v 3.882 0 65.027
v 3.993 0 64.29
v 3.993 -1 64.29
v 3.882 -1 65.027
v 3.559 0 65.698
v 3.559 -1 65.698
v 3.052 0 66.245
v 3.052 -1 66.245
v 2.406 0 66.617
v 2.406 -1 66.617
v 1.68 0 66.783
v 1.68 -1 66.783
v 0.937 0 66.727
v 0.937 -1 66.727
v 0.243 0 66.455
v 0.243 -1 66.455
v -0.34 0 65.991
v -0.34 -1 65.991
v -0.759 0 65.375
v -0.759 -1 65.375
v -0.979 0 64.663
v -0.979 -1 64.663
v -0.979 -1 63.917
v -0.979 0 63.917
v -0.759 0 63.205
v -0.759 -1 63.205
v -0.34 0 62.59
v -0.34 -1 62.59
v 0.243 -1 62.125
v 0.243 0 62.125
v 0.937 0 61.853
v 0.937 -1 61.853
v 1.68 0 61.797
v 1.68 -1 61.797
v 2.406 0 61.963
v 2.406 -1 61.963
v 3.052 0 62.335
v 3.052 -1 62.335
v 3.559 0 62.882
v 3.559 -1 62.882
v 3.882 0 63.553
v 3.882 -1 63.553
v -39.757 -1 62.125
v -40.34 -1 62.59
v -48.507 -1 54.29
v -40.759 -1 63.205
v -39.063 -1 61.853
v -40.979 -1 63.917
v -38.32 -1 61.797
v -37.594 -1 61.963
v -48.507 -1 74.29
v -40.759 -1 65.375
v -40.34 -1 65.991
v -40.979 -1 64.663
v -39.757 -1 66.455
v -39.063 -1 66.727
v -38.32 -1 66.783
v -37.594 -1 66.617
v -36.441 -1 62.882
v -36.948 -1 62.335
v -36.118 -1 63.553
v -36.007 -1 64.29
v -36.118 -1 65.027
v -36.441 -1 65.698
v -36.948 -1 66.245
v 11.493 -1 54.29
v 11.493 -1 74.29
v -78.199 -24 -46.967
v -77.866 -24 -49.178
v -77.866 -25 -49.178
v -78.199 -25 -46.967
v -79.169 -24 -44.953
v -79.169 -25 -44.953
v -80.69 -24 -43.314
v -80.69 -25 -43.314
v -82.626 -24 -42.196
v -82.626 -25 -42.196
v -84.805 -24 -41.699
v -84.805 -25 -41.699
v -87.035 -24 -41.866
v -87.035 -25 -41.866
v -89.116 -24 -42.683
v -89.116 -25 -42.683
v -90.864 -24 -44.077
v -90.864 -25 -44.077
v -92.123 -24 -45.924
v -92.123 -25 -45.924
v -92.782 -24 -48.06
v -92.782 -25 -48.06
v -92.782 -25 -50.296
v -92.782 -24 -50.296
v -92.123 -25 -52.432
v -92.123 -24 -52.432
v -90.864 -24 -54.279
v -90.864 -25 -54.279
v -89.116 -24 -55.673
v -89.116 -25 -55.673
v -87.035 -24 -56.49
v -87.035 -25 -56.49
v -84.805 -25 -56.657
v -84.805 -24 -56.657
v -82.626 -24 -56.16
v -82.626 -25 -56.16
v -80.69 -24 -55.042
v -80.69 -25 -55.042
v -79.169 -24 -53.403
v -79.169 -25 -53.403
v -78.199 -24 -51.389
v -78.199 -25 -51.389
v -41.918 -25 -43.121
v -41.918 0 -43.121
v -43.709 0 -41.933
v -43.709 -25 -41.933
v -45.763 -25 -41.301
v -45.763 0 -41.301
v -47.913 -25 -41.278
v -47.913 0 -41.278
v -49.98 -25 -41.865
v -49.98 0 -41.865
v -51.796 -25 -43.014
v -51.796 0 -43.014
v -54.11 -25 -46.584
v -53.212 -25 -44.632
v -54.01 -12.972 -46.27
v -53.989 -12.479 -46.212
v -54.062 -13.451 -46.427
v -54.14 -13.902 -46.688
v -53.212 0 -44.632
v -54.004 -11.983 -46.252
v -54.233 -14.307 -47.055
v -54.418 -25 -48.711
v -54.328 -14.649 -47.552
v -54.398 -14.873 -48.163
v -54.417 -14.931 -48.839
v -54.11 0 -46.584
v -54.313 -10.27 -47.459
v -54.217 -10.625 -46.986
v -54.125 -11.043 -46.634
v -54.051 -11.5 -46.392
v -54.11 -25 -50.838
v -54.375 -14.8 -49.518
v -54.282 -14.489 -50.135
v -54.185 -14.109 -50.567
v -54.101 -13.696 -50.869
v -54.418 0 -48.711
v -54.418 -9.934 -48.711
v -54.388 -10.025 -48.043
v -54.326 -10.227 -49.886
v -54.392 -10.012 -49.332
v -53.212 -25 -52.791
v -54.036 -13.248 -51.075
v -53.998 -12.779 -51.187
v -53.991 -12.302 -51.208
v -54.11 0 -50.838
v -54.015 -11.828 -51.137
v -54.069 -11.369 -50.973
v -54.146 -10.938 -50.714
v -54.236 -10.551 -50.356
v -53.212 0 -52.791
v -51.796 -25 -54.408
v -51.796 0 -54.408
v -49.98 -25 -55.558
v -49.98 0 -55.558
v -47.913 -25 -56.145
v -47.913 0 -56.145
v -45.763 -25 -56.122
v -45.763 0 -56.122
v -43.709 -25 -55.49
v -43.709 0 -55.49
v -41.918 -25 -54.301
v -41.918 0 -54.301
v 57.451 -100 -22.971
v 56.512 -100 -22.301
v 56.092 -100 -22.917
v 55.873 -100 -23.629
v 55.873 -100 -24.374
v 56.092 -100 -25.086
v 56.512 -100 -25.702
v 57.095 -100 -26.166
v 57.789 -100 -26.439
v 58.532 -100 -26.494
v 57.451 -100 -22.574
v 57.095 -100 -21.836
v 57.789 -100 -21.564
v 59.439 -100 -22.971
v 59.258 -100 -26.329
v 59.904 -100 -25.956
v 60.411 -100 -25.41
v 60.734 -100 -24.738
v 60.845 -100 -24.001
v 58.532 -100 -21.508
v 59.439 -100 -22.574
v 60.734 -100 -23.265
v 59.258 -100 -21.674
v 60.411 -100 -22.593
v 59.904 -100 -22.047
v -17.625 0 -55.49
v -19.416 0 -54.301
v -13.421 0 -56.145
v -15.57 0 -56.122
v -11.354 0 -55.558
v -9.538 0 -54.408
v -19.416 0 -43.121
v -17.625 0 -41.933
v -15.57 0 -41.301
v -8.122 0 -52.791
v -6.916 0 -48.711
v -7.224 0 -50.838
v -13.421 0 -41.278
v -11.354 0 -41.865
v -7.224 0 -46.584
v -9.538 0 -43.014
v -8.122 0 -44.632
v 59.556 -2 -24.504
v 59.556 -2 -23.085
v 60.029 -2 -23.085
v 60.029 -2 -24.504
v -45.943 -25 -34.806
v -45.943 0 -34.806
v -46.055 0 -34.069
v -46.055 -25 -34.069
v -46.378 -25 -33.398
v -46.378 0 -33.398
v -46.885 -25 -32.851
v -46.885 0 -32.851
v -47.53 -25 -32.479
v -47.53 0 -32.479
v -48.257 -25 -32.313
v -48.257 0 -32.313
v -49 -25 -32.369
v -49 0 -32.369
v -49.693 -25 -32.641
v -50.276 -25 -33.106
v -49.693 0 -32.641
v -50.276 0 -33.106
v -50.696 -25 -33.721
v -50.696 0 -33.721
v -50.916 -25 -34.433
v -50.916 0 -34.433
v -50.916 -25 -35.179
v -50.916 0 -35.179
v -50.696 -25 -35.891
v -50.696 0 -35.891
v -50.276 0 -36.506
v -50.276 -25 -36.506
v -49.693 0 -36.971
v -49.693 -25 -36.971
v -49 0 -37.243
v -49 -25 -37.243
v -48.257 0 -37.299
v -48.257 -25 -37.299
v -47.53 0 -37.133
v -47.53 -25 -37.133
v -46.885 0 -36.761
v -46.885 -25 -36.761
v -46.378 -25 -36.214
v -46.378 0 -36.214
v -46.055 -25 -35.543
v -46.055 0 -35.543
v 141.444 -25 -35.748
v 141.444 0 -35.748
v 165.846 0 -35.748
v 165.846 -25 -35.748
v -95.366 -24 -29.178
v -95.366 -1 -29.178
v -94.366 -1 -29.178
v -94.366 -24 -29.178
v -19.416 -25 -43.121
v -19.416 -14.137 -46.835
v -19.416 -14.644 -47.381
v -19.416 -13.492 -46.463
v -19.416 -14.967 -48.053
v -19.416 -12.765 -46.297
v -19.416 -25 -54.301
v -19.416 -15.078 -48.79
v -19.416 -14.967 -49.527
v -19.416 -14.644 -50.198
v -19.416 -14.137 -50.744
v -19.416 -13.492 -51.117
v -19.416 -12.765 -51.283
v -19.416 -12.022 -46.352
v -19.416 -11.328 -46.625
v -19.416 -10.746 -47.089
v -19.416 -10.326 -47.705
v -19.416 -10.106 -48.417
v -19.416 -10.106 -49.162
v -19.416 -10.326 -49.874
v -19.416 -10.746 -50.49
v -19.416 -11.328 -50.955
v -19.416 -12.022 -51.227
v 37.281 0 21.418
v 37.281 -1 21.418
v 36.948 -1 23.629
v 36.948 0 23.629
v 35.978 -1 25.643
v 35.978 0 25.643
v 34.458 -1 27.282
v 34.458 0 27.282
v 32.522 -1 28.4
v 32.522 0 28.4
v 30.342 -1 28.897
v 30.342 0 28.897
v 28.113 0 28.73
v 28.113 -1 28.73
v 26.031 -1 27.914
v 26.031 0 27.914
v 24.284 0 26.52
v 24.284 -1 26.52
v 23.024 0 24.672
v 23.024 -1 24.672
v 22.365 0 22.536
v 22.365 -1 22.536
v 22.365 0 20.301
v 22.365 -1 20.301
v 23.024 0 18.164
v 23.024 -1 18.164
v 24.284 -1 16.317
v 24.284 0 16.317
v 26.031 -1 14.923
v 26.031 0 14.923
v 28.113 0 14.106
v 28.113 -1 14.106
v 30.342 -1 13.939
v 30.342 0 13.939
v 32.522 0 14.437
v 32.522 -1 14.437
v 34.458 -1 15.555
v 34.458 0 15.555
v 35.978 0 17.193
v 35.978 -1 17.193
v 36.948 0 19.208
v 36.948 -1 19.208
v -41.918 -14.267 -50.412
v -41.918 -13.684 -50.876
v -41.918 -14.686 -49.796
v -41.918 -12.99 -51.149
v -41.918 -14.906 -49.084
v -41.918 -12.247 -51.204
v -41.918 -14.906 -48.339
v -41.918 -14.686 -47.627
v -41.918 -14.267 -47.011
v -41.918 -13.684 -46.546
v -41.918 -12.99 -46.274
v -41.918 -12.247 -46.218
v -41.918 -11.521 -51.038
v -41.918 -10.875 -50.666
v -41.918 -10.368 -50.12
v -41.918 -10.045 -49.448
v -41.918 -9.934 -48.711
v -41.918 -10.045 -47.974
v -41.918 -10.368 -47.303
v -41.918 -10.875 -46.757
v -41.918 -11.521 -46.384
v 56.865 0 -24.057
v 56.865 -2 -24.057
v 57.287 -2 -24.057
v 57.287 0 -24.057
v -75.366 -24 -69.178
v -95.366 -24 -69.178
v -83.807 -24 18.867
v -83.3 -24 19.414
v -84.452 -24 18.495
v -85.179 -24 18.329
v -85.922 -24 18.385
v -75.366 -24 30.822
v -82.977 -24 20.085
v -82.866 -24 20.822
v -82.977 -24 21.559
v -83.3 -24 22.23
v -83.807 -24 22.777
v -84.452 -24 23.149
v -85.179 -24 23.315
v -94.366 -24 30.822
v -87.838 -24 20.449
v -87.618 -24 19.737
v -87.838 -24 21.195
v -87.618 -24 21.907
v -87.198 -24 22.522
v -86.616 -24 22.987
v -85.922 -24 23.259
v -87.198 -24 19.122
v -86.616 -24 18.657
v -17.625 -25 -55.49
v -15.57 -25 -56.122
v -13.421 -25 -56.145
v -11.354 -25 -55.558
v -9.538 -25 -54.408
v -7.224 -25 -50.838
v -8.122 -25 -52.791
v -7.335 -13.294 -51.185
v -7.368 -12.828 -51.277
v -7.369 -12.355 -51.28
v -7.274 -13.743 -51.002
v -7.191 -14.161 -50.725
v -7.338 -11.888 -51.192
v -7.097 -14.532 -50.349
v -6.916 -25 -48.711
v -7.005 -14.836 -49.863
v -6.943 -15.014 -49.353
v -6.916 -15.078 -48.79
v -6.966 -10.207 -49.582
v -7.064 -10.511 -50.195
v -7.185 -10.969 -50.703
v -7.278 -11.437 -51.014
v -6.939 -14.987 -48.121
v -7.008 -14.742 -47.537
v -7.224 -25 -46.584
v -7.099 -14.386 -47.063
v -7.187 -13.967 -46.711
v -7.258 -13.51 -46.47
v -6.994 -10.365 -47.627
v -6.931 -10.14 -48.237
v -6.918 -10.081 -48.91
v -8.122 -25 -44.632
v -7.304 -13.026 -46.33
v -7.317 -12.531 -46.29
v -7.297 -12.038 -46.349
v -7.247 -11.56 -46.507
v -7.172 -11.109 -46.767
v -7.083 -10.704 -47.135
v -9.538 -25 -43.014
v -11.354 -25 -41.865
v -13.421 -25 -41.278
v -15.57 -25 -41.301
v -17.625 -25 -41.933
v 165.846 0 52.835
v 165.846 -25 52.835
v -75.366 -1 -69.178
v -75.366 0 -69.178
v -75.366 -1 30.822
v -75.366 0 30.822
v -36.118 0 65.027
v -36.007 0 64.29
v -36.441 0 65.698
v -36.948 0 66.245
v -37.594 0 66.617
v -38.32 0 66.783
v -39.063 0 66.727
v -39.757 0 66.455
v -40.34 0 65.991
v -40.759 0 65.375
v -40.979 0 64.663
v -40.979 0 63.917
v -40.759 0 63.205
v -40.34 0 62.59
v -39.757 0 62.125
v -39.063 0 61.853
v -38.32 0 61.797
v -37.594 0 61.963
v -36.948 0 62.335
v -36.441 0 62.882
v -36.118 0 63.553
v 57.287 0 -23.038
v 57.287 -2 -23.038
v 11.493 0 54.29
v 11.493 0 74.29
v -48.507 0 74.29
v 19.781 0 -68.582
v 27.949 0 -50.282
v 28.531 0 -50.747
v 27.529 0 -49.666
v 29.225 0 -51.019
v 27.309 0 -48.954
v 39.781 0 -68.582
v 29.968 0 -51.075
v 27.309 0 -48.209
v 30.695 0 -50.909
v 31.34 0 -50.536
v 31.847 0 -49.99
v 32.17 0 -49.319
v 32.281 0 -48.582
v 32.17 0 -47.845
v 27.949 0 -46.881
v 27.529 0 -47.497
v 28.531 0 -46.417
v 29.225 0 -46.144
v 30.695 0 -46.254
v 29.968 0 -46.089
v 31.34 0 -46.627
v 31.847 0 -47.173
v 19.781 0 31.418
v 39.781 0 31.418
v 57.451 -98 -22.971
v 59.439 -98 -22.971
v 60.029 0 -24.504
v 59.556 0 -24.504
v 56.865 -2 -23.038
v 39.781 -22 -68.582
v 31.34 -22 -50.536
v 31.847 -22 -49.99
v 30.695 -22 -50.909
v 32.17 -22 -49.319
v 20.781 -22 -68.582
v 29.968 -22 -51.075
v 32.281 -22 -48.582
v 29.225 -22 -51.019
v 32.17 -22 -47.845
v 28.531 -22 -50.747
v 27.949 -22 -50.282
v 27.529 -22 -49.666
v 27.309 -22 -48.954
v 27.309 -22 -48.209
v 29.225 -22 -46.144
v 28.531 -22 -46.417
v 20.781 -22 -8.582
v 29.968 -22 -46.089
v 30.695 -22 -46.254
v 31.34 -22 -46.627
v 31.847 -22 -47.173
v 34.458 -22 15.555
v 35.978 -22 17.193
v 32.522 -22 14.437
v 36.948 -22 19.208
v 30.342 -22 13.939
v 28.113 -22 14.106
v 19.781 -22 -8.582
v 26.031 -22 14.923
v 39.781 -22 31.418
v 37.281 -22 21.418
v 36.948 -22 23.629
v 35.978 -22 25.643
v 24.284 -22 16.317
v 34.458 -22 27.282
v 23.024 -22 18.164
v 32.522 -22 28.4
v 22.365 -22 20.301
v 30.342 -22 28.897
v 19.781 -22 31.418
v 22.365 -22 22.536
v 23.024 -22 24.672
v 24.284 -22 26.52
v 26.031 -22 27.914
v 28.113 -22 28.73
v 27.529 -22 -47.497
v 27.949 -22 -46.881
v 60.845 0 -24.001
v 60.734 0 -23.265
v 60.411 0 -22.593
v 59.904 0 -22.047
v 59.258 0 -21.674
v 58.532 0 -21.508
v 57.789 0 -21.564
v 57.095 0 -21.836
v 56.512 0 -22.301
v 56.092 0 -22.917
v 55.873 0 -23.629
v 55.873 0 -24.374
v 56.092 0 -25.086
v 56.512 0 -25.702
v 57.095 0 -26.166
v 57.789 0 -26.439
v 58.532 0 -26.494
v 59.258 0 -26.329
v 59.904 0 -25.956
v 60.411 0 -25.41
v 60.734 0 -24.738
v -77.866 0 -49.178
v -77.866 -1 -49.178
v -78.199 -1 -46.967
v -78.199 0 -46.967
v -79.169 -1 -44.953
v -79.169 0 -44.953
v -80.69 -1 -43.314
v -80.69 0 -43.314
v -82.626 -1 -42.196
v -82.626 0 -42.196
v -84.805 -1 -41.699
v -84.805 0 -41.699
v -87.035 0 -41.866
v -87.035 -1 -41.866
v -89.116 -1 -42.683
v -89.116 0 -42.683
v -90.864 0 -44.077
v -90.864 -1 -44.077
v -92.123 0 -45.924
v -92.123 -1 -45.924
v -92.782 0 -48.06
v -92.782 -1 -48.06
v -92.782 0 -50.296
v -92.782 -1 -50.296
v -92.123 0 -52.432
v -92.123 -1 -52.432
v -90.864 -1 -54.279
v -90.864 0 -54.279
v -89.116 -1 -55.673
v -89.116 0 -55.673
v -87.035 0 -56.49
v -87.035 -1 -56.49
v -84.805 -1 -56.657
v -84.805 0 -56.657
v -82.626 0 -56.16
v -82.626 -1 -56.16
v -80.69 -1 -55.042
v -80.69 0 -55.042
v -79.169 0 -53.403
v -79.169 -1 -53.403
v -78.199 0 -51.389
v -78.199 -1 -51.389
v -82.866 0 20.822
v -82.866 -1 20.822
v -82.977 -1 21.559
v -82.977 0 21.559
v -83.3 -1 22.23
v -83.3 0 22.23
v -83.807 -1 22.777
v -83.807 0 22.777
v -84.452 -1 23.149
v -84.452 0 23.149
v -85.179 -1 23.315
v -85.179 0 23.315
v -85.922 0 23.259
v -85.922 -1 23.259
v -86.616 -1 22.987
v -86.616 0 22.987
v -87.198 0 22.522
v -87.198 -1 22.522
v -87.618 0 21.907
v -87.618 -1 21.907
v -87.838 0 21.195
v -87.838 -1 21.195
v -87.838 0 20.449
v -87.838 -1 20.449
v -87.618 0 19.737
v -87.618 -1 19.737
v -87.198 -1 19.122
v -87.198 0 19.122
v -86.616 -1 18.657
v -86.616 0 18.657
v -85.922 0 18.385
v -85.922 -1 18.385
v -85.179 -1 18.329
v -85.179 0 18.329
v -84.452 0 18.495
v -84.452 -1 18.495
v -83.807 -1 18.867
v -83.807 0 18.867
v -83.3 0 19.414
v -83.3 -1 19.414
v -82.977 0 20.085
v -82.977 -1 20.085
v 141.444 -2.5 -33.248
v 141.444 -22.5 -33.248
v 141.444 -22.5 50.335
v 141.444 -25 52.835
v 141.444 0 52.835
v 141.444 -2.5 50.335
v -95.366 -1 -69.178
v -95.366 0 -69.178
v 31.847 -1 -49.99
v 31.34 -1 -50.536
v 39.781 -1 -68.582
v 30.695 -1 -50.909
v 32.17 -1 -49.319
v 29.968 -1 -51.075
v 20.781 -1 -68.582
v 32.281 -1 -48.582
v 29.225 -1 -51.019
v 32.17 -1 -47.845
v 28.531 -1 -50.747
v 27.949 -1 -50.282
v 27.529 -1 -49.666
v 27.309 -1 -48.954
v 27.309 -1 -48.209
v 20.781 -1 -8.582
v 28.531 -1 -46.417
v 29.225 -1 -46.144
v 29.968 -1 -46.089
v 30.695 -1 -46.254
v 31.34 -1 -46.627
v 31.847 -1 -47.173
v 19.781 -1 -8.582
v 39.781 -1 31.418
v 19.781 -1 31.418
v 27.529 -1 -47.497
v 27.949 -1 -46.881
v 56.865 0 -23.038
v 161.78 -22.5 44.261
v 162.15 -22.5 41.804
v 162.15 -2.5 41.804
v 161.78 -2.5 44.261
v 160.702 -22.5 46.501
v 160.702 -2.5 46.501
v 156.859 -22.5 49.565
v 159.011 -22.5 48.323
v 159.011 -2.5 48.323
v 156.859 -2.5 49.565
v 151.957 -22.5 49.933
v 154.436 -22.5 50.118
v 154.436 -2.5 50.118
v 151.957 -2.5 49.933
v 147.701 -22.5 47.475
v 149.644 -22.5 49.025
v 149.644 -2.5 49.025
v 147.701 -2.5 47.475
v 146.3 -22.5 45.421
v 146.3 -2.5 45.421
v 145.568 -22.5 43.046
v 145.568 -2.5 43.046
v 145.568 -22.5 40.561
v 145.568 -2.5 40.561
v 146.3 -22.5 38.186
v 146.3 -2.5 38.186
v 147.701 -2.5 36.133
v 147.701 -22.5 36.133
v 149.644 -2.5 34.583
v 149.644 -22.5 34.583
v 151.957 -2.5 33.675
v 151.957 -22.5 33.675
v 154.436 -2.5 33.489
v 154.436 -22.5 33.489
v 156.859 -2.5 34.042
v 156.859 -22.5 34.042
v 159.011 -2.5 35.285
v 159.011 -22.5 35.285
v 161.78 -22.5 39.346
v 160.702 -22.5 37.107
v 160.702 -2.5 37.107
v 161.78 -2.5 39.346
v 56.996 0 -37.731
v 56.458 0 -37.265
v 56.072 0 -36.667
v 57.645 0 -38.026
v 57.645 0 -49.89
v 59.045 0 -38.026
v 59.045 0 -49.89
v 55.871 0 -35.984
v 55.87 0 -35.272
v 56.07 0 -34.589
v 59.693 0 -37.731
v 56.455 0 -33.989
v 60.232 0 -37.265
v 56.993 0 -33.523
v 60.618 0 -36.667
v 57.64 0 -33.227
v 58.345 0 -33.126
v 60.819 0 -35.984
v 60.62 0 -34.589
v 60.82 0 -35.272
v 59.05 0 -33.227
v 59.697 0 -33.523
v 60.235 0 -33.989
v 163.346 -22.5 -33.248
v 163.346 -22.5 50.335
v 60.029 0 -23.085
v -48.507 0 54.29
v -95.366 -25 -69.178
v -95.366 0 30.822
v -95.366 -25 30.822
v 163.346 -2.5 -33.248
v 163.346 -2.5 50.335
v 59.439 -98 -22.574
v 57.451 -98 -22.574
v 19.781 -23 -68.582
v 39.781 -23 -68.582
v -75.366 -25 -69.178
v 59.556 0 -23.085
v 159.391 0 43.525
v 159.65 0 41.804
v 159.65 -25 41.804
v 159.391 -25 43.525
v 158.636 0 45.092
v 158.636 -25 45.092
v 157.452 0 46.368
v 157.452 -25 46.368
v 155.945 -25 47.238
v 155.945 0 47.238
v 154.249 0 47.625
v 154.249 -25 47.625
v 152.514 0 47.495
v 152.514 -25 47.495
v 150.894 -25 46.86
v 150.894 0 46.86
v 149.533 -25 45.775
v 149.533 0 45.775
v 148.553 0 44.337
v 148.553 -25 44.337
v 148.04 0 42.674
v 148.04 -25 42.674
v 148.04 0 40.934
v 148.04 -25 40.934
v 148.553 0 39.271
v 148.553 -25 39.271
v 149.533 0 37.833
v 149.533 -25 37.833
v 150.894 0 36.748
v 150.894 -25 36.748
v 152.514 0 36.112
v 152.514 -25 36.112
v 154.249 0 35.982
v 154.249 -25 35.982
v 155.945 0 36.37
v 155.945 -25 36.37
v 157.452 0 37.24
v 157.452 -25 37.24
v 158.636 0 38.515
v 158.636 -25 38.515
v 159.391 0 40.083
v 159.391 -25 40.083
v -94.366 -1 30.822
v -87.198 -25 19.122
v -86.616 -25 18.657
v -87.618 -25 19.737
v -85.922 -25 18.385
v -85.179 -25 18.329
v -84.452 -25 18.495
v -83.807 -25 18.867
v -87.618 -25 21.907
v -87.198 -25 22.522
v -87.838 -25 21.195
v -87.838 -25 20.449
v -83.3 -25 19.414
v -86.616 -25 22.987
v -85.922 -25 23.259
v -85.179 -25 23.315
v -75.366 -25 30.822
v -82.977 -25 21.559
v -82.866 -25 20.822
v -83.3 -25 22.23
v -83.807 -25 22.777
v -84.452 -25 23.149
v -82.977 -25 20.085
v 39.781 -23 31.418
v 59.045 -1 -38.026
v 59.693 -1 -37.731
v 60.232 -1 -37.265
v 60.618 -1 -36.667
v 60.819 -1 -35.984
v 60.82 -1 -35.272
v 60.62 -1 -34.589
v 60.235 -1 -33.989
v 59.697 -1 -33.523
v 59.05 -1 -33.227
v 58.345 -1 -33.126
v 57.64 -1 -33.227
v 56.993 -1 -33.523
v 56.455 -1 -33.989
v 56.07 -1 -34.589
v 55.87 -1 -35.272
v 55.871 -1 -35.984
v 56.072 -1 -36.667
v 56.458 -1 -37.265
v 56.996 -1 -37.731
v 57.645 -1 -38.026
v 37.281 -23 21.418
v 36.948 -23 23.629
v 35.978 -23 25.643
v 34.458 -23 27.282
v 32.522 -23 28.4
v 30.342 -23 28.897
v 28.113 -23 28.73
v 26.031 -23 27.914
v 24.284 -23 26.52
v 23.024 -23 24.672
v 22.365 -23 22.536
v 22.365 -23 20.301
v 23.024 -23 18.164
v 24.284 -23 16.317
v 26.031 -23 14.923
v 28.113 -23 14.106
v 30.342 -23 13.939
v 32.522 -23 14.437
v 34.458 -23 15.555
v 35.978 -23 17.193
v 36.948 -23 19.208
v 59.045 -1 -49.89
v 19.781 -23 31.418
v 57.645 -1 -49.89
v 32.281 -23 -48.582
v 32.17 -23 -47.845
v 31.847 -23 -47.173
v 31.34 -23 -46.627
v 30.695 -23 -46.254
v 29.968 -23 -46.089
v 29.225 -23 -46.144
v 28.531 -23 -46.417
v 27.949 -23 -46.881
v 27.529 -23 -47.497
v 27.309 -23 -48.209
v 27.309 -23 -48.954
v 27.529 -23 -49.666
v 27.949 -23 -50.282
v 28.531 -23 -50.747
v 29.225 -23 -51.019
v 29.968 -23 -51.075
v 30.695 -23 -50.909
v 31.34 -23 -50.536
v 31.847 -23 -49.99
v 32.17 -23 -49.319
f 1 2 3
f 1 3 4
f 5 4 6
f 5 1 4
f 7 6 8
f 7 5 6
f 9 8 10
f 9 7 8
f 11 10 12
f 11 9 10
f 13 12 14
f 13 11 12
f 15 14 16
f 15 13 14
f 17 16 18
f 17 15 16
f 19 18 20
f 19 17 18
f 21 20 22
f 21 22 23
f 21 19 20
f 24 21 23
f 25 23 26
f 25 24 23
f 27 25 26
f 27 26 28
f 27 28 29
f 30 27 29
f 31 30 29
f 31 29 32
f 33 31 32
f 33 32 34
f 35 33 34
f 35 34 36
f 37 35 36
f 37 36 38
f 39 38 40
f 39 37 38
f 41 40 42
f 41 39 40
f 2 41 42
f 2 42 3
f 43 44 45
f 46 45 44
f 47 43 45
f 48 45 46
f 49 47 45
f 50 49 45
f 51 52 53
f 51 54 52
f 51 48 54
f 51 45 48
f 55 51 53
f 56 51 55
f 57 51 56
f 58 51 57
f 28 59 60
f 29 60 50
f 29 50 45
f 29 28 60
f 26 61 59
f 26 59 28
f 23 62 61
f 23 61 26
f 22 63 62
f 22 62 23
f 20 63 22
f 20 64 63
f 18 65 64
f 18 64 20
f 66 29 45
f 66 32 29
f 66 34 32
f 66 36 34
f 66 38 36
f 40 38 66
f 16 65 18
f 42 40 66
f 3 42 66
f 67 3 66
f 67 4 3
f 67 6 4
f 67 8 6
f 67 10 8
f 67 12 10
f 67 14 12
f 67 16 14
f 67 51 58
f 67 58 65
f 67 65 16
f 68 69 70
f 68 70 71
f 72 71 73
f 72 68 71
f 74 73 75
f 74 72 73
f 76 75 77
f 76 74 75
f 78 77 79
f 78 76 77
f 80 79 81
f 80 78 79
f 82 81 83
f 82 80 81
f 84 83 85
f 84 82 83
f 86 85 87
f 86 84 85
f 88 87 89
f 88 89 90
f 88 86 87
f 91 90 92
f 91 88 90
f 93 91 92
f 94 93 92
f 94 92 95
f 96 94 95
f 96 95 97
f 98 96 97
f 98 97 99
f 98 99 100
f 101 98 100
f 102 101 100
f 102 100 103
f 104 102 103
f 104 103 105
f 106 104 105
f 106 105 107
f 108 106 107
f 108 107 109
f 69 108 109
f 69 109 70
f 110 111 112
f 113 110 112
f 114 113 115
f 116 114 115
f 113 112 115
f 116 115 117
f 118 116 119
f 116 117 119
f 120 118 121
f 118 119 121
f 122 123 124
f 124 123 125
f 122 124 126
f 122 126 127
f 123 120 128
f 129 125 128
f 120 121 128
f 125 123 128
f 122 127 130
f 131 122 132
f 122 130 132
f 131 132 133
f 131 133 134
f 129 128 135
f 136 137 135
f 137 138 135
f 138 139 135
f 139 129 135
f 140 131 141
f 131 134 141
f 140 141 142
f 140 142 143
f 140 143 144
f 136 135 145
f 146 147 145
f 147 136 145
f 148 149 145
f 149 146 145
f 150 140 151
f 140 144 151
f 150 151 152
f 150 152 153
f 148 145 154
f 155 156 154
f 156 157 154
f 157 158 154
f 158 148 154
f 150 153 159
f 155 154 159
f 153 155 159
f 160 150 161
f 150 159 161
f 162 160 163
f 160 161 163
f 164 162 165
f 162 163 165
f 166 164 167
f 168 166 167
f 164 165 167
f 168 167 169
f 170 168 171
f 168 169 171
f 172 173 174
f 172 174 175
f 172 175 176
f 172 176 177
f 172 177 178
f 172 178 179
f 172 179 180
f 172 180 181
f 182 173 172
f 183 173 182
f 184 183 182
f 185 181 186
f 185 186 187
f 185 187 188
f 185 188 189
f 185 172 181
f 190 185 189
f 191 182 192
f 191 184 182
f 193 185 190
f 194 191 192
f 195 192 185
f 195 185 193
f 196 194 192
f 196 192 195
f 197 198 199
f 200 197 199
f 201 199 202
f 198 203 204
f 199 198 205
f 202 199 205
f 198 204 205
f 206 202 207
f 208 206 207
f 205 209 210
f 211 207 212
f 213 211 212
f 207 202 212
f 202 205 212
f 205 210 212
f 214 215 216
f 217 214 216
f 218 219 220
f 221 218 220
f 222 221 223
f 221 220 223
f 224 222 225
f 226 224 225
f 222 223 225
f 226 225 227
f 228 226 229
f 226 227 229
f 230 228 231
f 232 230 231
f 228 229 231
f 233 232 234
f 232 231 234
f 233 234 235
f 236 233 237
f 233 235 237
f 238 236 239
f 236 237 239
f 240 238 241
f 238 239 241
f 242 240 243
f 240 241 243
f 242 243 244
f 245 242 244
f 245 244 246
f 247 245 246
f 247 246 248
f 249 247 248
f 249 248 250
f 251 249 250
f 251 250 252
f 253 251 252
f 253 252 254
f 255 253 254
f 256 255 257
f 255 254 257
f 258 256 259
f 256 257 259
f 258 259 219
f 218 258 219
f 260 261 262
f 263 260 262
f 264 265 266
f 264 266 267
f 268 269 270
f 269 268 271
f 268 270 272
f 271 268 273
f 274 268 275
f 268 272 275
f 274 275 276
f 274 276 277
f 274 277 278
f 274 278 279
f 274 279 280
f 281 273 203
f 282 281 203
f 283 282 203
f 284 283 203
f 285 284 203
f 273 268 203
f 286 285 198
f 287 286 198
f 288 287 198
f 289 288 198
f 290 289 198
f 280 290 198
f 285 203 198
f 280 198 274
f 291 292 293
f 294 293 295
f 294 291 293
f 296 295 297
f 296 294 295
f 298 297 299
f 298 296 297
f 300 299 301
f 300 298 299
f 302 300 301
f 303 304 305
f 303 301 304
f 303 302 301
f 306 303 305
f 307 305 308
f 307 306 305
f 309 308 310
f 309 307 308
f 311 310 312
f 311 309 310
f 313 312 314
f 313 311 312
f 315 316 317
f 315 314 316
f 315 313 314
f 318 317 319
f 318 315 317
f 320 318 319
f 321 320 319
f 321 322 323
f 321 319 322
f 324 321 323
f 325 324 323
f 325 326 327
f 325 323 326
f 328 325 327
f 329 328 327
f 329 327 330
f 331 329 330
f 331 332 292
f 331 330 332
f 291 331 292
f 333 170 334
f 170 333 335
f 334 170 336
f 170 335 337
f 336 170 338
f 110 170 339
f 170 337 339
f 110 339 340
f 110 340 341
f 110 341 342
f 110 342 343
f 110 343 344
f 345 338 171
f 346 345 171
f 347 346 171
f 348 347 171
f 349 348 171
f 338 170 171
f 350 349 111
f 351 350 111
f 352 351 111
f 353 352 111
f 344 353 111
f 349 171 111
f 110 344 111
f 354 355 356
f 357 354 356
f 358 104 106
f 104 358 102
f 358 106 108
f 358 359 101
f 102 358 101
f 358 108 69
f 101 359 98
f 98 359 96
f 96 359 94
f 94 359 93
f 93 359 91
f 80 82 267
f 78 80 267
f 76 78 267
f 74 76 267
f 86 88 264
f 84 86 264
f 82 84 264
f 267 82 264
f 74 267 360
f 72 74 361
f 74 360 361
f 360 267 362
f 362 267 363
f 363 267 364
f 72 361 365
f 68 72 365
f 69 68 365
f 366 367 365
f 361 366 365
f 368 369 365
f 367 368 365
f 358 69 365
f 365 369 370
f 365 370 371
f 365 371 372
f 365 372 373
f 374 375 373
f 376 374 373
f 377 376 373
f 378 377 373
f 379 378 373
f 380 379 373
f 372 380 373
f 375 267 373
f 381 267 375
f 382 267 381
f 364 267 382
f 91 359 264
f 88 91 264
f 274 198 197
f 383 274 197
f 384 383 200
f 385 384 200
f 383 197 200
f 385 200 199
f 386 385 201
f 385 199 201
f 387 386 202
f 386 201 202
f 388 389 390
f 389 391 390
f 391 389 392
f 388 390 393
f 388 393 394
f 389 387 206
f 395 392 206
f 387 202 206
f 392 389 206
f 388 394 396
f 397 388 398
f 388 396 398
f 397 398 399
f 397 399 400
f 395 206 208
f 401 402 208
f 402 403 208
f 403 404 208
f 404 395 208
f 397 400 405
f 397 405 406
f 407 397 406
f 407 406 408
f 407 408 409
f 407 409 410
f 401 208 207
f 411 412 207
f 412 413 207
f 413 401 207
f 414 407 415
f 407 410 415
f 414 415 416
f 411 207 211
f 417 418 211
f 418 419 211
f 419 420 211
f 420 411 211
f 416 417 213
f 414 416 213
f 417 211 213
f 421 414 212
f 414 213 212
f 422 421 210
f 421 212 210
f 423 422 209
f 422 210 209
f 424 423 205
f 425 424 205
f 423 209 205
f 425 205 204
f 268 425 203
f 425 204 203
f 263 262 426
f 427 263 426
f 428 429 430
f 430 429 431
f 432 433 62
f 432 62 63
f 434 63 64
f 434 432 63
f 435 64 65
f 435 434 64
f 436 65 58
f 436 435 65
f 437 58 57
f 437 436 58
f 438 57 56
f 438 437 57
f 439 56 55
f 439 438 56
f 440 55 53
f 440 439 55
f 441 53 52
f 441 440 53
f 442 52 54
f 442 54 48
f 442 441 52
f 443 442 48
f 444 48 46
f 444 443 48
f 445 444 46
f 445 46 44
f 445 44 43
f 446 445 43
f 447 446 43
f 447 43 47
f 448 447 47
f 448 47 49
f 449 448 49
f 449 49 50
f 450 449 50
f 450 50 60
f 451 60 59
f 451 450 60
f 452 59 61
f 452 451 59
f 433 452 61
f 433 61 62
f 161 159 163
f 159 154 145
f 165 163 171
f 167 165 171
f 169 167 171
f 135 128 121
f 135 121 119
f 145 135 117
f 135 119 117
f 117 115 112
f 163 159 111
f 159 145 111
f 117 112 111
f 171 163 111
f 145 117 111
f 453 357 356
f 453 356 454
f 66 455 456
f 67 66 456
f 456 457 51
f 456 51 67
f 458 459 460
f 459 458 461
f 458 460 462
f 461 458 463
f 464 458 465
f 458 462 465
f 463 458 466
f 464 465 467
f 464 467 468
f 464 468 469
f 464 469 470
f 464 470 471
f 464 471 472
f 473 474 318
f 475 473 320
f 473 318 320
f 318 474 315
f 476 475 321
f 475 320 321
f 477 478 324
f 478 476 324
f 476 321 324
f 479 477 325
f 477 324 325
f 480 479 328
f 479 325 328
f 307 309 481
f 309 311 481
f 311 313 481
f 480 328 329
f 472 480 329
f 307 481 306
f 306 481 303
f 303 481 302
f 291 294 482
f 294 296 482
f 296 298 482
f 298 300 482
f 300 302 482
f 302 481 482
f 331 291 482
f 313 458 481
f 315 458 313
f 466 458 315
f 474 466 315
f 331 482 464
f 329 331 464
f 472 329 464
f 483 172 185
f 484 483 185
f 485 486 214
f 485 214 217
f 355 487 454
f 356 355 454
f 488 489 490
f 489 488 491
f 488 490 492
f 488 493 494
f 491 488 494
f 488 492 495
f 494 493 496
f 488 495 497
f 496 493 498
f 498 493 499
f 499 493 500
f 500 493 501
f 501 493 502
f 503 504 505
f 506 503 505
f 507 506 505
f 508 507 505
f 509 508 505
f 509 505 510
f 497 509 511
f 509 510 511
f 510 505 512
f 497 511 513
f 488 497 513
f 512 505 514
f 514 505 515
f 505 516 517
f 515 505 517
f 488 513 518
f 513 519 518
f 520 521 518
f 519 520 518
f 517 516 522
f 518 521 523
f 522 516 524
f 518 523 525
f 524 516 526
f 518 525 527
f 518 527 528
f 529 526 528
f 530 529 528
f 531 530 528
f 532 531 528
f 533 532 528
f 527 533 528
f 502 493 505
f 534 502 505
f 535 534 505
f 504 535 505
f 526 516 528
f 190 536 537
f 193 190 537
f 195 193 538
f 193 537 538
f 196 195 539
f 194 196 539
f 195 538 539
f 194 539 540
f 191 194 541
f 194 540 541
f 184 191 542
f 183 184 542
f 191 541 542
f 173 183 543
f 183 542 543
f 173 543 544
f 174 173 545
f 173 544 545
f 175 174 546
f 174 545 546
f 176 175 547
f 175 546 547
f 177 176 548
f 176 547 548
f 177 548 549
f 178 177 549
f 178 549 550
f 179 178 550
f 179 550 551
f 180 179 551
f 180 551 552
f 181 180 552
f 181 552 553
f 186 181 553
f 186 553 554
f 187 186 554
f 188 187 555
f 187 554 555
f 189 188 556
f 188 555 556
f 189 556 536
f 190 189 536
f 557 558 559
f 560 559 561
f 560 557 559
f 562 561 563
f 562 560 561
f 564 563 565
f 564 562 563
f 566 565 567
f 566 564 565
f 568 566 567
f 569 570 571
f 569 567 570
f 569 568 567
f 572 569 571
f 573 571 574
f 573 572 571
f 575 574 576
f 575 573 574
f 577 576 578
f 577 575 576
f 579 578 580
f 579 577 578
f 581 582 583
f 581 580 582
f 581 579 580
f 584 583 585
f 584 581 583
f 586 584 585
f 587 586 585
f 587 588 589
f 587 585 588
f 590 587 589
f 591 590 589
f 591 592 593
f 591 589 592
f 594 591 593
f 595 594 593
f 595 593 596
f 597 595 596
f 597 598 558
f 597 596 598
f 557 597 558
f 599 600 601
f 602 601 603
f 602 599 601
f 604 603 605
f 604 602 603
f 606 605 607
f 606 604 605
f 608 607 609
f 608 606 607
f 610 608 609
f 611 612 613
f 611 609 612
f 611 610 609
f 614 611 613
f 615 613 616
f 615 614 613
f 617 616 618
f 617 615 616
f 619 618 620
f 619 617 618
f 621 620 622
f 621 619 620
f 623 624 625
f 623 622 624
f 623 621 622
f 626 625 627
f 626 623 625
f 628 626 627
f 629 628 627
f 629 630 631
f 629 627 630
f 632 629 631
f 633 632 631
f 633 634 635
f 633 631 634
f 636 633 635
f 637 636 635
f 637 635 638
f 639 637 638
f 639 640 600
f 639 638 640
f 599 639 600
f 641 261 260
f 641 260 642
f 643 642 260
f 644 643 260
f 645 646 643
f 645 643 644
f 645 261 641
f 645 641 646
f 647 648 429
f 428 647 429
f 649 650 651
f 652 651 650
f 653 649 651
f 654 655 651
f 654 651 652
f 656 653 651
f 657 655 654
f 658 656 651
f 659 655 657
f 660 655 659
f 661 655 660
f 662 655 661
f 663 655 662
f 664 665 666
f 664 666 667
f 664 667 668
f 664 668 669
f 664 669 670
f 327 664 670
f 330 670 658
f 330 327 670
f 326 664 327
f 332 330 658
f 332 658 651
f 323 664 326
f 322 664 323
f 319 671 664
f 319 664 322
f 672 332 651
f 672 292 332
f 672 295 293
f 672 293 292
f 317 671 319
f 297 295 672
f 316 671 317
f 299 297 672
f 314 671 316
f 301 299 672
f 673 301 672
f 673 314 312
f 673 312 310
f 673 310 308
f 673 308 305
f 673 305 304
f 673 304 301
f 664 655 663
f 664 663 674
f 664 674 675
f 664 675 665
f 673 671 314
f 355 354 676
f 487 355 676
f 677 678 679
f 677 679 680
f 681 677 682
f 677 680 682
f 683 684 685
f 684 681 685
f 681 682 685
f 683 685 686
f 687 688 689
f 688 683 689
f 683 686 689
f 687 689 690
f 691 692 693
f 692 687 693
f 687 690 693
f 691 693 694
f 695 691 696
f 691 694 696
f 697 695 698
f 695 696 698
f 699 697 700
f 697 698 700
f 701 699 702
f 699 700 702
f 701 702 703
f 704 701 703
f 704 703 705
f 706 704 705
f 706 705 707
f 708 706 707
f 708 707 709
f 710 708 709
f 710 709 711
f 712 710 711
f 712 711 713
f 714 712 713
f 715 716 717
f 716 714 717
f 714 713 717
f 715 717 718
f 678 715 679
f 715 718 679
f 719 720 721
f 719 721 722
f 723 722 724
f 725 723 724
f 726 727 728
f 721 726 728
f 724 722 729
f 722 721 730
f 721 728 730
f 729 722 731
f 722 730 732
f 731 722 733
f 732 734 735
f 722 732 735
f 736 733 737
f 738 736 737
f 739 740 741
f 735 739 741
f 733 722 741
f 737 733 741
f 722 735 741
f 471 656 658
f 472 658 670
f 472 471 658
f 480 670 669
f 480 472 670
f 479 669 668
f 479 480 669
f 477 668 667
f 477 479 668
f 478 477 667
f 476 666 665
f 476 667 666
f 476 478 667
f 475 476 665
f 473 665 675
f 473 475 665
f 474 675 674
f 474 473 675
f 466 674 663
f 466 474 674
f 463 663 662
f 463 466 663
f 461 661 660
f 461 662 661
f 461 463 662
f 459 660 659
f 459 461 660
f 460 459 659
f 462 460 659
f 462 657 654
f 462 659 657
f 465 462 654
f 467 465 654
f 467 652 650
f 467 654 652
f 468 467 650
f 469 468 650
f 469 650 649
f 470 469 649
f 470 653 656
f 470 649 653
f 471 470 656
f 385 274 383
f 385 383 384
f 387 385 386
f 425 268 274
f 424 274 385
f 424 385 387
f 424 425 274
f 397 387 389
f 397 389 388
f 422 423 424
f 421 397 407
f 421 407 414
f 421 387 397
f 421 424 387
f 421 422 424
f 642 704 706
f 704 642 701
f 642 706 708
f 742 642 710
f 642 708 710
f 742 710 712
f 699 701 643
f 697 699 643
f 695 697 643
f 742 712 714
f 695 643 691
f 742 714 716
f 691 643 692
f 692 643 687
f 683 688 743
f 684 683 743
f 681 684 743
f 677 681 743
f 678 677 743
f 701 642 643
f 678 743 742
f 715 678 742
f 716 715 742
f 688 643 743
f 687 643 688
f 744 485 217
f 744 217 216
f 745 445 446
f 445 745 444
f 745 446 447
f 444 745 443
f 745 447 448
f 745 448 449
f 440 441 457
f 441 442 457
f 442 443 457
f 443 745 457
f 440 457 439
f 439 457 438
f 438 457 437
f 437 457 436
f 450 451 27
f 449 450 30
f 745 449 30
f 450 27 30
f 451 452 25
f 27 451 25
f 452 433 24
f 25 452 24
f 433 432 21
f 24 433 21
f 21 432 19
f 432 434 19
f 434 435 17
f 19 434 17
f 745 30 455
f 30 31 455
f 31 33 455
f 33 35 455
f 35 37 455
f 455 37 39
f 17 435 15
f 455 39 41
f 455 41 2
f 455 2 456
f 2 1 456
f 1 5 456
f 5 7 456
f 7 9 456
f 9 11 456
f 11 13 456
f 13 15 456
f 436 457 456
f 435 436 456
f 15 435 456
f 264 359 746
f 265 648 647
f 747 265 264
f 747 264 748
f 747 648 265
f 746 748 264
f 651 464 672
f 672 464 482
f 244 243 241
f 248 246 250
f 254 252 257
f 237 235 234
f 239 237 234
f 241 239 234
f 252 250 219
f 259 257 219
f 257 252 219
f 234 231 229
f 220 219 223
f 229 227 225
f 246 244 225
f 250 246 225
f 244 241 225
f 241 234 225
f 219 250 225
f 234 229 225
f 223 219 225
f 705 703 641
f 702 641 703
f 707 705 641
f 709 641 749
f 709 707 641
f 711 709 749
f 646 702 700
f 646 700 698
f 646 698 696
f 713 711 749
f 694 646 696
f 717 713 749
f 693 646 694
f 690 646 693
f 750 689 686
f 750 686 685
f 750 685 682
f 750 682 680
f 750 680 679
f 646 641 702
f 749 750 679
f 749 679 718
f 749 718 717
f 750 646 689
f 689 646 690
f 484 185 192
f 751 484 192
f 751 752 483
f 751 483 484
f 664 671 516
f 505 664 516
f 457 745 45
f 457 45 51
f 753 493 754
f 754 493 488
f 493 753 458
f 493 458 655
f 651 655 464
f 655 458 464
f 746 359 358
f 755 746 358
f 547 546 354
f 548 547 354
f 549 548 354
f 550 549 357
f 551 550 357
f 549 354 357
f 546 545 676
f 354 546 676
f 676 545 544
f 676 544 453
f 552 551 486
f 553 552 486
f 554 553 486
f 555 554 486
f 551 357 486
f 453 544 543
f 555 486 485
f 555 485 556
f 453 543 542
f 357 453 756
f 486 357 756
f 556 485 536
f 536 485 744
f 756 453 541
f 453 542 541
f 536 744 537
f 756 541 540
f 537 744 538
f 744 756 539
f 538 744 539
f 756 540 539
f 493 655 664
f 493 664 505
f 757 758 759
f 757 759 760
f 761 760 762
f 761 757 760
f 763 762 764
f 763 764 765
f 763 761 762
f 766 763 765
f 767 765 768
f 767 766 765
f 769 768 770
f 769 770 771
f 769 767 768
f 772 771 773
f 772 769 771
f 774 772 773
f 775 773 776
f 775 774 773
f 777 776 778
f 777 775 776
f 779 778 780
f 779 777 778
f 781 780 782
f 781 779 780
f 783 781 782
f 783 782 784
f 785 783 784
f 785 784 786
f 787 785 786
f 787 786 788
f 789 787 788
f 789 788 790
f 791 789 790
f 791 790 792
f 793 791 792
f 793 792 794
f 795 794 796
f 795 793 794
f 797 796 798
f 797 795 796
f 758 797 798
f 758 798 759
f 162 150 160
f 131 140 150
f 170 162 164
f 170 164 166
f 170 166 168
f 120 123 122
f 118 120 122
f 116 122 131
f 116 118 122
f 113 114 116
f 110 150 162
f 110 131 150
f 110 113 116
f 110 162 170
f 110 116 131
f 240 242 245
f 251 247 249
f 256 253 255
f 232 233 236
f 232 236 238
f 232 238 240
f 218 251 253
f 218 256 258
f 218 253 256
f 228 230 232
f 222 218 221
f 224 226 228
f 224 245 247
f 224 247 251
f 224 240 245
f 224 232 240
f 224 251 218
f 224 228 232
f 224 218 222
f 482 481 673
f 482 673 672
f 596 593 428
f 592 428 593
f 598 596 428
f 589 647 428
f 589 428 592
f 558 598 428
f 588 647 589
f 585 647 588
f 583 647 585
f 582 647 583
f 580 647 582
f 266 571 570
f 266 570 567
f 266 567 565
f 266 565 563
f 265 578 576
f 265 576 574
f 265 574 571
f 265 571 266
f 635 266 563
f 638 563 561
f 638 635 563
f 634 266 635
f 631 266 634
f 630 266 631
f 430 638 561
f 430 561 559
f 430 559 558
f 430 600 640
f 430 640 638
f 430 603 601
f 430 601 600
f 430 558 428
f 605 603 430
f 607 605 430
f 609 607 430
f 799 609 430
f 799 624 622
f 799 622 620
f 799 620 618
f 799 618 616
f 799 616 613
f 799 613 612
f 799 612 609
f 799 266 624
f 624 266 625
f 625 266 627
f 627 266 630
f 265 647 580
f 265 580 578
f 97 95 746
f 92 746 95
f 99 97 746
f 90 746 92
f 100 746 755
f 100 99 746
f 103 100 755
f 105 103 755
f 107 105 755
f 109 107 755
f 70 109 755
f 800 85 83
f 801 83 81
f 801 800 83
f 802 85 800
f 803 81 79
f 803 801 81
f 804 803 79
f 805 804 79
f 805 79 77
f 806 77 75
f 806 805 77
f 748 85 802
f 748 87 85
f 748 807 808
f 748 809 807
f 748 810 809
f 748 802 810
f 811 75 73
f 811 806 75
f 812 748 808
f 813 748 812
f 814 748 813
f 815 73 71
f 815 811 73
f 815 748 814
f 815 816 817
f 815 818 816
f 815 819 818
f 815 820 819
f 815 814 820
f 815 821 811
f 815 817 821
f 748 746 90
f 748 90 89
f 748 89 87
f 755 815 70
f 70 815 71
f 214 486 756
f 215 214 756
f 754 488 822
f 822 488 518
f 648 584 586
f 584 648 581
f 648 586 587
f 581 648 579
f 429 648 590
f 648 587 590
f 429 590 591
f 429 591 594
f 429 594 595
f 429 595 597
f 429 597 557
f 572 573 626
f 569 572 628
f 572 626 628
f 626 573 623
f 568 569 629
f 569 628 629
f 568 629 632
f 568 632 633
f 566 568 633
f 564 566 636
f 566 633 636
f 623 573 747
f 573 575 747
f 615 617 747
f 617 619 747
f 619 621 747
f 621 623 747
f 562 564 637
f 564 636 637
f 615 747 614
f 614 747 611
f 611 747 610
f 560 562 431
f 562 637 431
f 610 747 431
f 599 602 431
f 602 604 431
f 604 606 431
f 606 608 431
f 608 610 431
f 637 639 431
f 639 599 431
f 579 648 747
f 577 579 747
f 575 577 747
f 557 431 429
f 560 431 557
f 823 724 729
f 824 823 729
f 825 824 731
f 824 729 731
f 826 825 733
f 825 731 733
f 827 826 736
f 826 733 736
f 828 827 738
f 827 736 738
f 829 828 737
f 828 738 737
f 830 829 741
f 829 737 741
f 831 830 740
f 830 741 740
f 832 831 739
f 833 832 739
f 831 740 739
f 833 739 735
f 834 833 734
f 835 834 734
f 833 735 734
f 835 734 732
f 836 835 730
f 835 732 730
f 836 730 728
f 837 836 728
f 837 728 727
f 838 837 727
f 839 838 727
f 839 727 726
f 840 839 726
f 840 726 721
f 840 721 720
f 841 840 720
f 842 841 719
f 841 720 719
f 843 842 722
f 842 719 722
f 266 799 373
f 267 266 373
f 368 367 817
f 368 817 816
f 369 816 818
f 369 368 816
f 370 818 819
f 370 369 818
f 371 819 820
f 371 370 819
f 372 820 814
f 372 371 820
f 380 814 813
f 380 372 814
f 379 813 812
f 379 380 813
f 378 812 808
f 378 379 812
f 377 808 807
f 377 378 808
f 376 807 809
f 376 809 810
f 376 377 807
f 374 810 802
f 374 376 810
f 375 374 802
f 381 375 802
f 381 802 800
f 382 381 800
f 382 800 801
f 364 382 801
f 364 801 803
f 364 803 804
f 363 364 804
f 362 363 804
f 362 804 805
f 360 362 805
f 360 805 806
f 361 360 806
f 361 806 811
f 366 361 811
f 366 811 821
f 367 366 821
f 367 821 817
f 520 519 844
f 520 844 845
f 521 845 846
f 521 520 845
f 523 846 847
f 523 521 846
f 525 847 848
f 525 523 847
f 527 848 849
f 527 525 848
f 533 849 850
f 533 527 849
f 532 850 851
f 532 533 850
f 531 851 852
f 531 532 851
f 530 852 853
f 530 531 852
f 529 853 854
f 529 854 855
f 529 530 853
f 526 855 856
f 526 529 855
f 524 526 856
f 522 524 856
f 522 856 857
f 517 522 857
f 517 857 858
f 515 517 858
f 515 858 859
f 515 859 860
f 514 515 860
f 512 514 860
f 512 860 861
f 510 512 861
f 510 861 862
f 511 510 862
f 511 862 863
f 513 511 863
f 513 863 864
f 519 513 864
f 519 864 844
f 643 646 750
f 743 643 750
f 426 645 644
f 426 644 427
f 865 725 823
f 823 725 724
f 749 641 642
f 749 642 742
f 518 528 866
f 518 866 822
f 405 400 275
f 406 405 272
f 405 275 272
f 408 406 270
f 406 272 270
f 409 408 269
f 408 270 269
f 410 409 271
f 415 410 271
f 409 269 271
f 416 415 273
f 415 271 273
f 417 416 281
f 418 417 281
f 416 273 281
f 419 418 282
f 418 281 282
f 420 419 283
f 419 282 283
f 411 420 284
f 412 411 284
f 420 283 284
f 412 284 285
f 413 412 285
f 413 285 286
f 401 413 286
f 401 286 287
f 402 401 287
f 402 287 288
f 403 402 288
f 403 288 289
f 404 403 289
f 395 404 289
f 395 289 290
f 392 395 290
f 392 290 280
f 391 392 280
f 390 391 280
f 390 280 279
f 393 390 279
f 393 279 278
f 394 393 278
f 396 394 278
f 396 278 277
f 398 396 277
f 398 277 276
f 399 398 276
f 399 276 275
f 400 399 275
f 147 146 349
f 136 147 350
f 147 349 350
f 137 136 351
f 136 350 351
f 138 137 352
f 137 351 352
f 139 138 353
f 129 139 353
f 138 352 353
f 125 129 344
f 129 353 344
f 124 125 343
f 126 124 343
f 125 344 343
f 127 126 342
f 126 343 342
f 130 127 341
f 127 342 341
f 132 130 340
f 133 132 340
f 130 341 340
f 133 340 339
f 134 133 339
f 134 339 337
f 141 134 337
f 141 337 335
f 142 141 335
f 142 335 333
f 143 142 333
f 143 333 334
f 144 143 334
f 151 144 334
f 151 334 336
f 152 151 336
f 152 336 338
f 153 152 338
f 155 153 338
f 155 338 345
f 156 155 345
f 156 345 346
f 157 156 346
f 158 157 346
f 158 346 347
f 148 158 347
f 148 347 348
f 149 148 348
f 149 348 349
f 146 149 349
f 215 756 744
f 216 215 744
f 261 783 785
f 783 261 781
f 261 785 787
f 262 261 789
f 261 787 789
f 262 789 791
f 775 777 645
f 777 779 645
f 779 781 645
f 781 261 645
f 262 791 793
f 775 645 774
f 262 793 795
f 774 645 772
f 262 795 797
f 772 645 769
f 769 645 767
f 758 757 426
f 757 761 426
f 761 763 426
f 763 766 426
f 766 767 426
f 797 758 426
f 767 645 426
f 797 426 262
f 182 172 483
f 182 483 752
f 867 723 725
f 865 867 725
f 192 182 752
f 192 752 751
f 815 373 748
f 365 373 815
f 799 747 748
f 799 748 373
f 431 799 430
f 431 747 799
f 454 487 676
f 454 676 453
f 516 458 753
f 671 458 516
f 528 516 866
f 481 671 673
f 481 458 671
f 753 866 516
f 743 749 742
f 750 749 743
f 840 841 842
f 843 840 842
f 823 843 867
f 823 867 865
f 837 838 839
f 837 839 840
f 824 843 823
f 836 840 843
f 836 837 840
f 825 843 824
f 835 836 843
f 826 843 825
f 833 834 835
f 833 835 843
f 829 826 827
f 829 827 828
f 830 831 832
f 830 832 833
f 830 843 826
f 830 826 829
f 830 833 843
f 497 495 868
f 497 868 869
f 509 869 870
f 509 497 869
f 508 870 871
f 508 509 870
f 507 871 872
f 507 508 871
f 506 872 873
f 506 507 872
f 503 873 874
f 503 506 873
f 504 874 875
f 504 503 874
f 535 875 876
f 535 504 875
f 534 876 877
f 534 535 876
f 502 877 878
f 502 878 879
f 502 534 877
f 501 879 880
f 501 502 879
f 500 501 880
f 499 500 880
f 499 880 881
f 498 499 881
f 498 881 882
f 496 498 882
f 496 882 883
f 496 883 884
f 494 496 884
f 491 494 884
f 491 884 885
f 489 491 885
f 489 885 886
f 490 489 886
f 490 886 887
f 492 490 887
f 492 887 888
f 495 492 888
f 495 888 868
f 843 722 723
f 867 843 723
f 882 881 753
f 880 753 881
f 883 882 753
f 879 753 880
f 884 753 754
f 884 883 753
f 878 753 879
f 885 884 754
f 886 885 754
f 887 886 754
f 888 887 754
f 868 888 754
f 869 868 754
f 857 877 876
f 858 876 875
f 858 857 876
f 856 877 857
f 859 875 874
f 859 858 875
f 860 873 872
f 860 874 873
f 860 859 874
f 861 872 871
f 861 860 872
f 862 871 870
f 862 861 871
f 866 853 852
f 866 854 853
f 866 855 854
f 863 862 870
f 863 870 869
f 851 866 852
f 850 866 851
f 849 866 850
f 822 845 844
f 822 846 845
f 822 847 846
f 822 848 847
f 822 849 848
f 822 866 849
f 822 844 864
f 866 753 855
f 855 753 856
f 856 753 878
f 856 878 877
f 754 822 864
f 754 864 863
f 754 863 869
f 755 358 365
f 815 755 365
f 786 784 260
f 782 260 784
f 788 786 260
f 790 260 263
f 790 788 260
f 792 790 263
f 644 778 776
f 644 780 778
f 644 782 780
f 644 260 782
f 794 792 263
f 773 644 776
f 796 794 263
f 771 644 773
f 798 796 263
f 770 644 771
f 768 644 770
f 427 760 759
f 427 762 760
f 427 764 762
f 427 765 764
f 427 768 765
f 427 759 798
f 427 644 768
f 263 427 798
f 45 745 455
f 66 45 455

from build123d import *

# Parameters (mm, degrees)
F0_W      = 20
F0_H      = 100
F0_R      = 7.5
F0_R_2    = 2.5
F1_DEPTH  = 25
F2_DEPTH  = 25
F3_W      = 19
F3_H      = 23
F4_DEPTH  = 100
F5_DEPTH  = 23
F6_W      = 19
F6_H      = 21
F7_DEPTH  = 100
F8_W      = 23
F8_H      = 40
F9_DEPTH  = 1
F10_W     = 21
F10_H     = 40
F11_DEPTH = 1
F12_DEPTH = 25
F13_R     = 2.5
F14_DEPTH = 12.5
F15_DEPTH = 25
F16_R     = 2.5
F17_DEPTH = 12.5010001006
F18_DEPTH = 100
F19_DEPTH = 1
F20_W     = 1.9876025617
F20_H     = 0.3975201398
F21_DEPTH = 2
F22_W     = 0.4727318883
F22_H     = 1.4182012528
F22_W_2   = 0.4216358066
F22_H_2   = 1.0189469904
F23_DEPTH = 2
F0_W_2    = 60
F0_H_2    = 20
F24_DEPTH = 1
F0_W_3    = 24.4019627571
F0_H_3    = 88.5824598372
F0_R_3    = 5.8378194673
F25_DEPTH = 25
F26_T     = -2.5


with BuildPart() as f1:
    # F0 (on Front) → F1 (new body)
    with BuildSketch(Plane.XZ):
        with Locations((-85.3658488447, -19.1779926979)):
            Rectangle(F0_W, F0_H)
        with Locations((-85.3658488447, -49.1779926979)):
            Circle(F0_R, mode=Mode.SUBTRACT)
        with Locations((-85.3658488447, 20.8220073021)):
            Circle(F0_R_2, mode=Mode.SUBTRACT)
    extrude(amount=F1_DEPTH)

    # F3 (on face) → F4 (cut)
    with BuildSketch(Plane(origin=(0, 0, -69.1779926979), x_dir=(1, 0, 0), z_dir=(0, 0, -1))):
        with Locations((-84.8658488447, 12.5)):
            Rectangle(F3_W, F3_H)
    extrude(amount=-F4_DEPTH, mode=Mode.SUBTRACT)

    # F8 (on face) → F9 (cut, through all)
    with BuildSketch(Plane(origin=(-95.3658488447, 0, 0), x_dir=(0, -1, 0), z_dir=(-1, 0, 0))):
        with Locations((12.5, -49.1779926979)):
            Rectangle(F8_W, F8_H)
    extrude(amount=-F9_DEPTH, mode=Mode.SUBTRACT)


with BuildPart() as f2:
    # F0 (on Front) → F2 (new body)
    with BuildSketch(Plane.XZ):
        with Locations((-48.4434533864, -34.8060615361)):
            Circle(F0_R_2)
    extrude(amount=F2_DEPTH)


with BuildPart() as f5:
    # F0 (on Front) → F5 (new body)
    with BuildSketch(Plane.XZ):
        with Locations((29.7814775258, -18.581676666)):
            Rectangle(F0_W, F0_H)
        with Locations((29.7814775258, -48.581676666)):
            Circle(F0_R_2, mode=Mode.SUBTRACT)
        with Locations((29.7814775258, 21.418323334)):
            Circle(F0_R, mode=Mode.SUBTRACT)
    extrude(amount=F5_DEPTH)

    # F6 (on face) → F7 (cut)
    with BuildSketch(Plane(origin=(0, 0, -68.581676666), x_dir=(1, 0, 0), z_dir=(0, 0, -1))):
        with Locations((30.2814775258, 11.5)):
            Rectangle(F6_W, F6_H)
    extrude(amount=-F7_DEPTH, mode=Mode.SUBTRACT)

    # F10 (on face) → F11 (cut, through all)
    with BuildSketch(Plane(origin=(19.7814775258, 0, 0), x_dir=(0, -1, 0), z_dir=(-1, 0, 0))):
        with Locations((11.5, 11.418323334)):
            Rectangle(F10_W, F10_H)
    extrude(amount=-F11_DEPTH, mode=Mode.SUBTRACT)


with BuildPart() as f12:
    # F0 (on Front) → F12 (new body)
    with BuildSketch(Plane.XZ):
        with BuildLine():
            Line((-41.9182138266, -54.3014750868), (-41.9182138266, -43.1211351993))
            ThreePointArc((-41.9182138266, -43.1211351993), (-54.4182138266, -48.7113051431), (-41.9182138266, -54.3014750868))
        make_face()
    extrude(amount=F12_DEPTH)

    # F13 (on face) → F14 (cut, through all)
    with BuildSketch(Plane.YZ.offset(-41.9182138266)):
        with Locations((-12.4340476468, -48.7113051431)):
            Circle(F13_R)
    extrude(amount=-F14_DEPTH, mode=Mode.SUBTRACT)


with BuildPart() as f15:
    # F0 (on Front) → F15 (new body)
    with BuildSketch(Plane.XZ):
        with BuildLine():
            ThreePointArc((-19.4155542431, -54.3014750868), (-6.9155542431, -48.7113051431), (-19.4155542431, -43.1211351993))
            Line((-19.4155542431, -43.1211351993), (-19.4155542431, -54.3014750868))
        make_face()
    extrude(amount=F15_DEPTH)

    # F16 (on face) → F17 (cut, through all)
    with BuildSketch(Plane(origin=(-19.4155542431, 0, 0), x_dir=(0, -1, 0), z_dir=(-1, 0, 0))):
        with Locations((12.5784268603, -48.7897321582)):
            Circle(F16_R)
    extrude(amount=-F17_DEPTH, mode=Mode.SUBTRACT)


with BuildPart() as f18:
    # F0 (on Front) → F18 (new body)
    with BuildSketch(Plane.XZ):
        with Locations((58.3449043334, -24.0014214069)):
            Circle(F0_R_2)
    extrude(amount=F18_DEPTH)

    # F20 (on face) → F21 (cut)
    with BuildSketch(Plane.XZ.offset(100)):
        with Locations((58.4452617913, -22.7724621072)):
            Rectangle(F20_W, F20_H)
    extrude(amount=-F21_DEPTH, mode=Mode.SUBTRACT)

    # F22 (on face) → F23 (cut)
    with BuildSketch(Plane.XZ):
        with Locations((59.7926527262, -23.7945998088)):
            Rectangle(F22_W, F22_H)
        with Locations((57.0760257542, -23.5474118963)):
            Rectangle(F22_W_2, F22_H_2)
    extrude(amount=F23_DEPTH, mode=Mode.SUBTRACT)


with BuildPart() as f19:
    # F0 (on Front) → F19 (new body)
    with BuildSketch(Plane.XZ):
        with BuildLine():
            Line((59.0452197349, -49.8900748789), (59.0452197349, -38.0256086664))
            ThreePointArc((59.0452197349, -38.0256086664), (58.3449043334, -33.125700681), (57.6445889318, -38.0256086664))
            Line((57.6445889318, -38.0256086664), (57.6445889318, -49.8900748789))
            Line((57.6445889318, -49.8900748789), (58.3449043334, -49.8900748789))
            Line((58.3449043334, -49.8900748789), (59.0452197349, -49.8900748789))
        make_face()
    extrude(amount=F19_DEPTH)


with BuildPart() as f24:
    # F0 (on Front) → F24 (new body)
    with BuildSketch(Plane.XZ):
        with Locations((-18.5069639981, 64.2900748551)):
            Rectangle(F0_W_2, F0_H_2)
        with Locations((-38.5069639981, 64.2900748551)):
            Circle(F0_R_2, mode=Mode.SUBTRACT)
        with Locations((1.4930360019, 64.2900748551)):
            Circle(F0_R_2, mode=Mode.SUBTRACT)
    extrude(amount=F24_DEPTH)


with BuildPart() as f25:
    # F0 (on Front) → F25 (new body)
    with BuildSketch(Plane.XZ):
        with Locations((153.6454260349, 8.5435975343)):
            Rectangle(F0_W_3, F0_H_3)
        with Locations((153.81257236, 41.8038032949)):
            Circle(F0_R_3, mode=Mode.SUBTRACT)
    extrude(amount=F25_DEPTH)

    # F26
    f26_openings = [f25.faces().sort_by_distance(p)[0] for p in [
        (141.444445, -12.5, 8.543598),
    ]]
    offset(amount=F26_T, openings=f26_openings)


solid = Compound([f1.part, f2.part, f5.part, f12.part, f15.part, f18.part, f19.part, f24.part, f25.part])
